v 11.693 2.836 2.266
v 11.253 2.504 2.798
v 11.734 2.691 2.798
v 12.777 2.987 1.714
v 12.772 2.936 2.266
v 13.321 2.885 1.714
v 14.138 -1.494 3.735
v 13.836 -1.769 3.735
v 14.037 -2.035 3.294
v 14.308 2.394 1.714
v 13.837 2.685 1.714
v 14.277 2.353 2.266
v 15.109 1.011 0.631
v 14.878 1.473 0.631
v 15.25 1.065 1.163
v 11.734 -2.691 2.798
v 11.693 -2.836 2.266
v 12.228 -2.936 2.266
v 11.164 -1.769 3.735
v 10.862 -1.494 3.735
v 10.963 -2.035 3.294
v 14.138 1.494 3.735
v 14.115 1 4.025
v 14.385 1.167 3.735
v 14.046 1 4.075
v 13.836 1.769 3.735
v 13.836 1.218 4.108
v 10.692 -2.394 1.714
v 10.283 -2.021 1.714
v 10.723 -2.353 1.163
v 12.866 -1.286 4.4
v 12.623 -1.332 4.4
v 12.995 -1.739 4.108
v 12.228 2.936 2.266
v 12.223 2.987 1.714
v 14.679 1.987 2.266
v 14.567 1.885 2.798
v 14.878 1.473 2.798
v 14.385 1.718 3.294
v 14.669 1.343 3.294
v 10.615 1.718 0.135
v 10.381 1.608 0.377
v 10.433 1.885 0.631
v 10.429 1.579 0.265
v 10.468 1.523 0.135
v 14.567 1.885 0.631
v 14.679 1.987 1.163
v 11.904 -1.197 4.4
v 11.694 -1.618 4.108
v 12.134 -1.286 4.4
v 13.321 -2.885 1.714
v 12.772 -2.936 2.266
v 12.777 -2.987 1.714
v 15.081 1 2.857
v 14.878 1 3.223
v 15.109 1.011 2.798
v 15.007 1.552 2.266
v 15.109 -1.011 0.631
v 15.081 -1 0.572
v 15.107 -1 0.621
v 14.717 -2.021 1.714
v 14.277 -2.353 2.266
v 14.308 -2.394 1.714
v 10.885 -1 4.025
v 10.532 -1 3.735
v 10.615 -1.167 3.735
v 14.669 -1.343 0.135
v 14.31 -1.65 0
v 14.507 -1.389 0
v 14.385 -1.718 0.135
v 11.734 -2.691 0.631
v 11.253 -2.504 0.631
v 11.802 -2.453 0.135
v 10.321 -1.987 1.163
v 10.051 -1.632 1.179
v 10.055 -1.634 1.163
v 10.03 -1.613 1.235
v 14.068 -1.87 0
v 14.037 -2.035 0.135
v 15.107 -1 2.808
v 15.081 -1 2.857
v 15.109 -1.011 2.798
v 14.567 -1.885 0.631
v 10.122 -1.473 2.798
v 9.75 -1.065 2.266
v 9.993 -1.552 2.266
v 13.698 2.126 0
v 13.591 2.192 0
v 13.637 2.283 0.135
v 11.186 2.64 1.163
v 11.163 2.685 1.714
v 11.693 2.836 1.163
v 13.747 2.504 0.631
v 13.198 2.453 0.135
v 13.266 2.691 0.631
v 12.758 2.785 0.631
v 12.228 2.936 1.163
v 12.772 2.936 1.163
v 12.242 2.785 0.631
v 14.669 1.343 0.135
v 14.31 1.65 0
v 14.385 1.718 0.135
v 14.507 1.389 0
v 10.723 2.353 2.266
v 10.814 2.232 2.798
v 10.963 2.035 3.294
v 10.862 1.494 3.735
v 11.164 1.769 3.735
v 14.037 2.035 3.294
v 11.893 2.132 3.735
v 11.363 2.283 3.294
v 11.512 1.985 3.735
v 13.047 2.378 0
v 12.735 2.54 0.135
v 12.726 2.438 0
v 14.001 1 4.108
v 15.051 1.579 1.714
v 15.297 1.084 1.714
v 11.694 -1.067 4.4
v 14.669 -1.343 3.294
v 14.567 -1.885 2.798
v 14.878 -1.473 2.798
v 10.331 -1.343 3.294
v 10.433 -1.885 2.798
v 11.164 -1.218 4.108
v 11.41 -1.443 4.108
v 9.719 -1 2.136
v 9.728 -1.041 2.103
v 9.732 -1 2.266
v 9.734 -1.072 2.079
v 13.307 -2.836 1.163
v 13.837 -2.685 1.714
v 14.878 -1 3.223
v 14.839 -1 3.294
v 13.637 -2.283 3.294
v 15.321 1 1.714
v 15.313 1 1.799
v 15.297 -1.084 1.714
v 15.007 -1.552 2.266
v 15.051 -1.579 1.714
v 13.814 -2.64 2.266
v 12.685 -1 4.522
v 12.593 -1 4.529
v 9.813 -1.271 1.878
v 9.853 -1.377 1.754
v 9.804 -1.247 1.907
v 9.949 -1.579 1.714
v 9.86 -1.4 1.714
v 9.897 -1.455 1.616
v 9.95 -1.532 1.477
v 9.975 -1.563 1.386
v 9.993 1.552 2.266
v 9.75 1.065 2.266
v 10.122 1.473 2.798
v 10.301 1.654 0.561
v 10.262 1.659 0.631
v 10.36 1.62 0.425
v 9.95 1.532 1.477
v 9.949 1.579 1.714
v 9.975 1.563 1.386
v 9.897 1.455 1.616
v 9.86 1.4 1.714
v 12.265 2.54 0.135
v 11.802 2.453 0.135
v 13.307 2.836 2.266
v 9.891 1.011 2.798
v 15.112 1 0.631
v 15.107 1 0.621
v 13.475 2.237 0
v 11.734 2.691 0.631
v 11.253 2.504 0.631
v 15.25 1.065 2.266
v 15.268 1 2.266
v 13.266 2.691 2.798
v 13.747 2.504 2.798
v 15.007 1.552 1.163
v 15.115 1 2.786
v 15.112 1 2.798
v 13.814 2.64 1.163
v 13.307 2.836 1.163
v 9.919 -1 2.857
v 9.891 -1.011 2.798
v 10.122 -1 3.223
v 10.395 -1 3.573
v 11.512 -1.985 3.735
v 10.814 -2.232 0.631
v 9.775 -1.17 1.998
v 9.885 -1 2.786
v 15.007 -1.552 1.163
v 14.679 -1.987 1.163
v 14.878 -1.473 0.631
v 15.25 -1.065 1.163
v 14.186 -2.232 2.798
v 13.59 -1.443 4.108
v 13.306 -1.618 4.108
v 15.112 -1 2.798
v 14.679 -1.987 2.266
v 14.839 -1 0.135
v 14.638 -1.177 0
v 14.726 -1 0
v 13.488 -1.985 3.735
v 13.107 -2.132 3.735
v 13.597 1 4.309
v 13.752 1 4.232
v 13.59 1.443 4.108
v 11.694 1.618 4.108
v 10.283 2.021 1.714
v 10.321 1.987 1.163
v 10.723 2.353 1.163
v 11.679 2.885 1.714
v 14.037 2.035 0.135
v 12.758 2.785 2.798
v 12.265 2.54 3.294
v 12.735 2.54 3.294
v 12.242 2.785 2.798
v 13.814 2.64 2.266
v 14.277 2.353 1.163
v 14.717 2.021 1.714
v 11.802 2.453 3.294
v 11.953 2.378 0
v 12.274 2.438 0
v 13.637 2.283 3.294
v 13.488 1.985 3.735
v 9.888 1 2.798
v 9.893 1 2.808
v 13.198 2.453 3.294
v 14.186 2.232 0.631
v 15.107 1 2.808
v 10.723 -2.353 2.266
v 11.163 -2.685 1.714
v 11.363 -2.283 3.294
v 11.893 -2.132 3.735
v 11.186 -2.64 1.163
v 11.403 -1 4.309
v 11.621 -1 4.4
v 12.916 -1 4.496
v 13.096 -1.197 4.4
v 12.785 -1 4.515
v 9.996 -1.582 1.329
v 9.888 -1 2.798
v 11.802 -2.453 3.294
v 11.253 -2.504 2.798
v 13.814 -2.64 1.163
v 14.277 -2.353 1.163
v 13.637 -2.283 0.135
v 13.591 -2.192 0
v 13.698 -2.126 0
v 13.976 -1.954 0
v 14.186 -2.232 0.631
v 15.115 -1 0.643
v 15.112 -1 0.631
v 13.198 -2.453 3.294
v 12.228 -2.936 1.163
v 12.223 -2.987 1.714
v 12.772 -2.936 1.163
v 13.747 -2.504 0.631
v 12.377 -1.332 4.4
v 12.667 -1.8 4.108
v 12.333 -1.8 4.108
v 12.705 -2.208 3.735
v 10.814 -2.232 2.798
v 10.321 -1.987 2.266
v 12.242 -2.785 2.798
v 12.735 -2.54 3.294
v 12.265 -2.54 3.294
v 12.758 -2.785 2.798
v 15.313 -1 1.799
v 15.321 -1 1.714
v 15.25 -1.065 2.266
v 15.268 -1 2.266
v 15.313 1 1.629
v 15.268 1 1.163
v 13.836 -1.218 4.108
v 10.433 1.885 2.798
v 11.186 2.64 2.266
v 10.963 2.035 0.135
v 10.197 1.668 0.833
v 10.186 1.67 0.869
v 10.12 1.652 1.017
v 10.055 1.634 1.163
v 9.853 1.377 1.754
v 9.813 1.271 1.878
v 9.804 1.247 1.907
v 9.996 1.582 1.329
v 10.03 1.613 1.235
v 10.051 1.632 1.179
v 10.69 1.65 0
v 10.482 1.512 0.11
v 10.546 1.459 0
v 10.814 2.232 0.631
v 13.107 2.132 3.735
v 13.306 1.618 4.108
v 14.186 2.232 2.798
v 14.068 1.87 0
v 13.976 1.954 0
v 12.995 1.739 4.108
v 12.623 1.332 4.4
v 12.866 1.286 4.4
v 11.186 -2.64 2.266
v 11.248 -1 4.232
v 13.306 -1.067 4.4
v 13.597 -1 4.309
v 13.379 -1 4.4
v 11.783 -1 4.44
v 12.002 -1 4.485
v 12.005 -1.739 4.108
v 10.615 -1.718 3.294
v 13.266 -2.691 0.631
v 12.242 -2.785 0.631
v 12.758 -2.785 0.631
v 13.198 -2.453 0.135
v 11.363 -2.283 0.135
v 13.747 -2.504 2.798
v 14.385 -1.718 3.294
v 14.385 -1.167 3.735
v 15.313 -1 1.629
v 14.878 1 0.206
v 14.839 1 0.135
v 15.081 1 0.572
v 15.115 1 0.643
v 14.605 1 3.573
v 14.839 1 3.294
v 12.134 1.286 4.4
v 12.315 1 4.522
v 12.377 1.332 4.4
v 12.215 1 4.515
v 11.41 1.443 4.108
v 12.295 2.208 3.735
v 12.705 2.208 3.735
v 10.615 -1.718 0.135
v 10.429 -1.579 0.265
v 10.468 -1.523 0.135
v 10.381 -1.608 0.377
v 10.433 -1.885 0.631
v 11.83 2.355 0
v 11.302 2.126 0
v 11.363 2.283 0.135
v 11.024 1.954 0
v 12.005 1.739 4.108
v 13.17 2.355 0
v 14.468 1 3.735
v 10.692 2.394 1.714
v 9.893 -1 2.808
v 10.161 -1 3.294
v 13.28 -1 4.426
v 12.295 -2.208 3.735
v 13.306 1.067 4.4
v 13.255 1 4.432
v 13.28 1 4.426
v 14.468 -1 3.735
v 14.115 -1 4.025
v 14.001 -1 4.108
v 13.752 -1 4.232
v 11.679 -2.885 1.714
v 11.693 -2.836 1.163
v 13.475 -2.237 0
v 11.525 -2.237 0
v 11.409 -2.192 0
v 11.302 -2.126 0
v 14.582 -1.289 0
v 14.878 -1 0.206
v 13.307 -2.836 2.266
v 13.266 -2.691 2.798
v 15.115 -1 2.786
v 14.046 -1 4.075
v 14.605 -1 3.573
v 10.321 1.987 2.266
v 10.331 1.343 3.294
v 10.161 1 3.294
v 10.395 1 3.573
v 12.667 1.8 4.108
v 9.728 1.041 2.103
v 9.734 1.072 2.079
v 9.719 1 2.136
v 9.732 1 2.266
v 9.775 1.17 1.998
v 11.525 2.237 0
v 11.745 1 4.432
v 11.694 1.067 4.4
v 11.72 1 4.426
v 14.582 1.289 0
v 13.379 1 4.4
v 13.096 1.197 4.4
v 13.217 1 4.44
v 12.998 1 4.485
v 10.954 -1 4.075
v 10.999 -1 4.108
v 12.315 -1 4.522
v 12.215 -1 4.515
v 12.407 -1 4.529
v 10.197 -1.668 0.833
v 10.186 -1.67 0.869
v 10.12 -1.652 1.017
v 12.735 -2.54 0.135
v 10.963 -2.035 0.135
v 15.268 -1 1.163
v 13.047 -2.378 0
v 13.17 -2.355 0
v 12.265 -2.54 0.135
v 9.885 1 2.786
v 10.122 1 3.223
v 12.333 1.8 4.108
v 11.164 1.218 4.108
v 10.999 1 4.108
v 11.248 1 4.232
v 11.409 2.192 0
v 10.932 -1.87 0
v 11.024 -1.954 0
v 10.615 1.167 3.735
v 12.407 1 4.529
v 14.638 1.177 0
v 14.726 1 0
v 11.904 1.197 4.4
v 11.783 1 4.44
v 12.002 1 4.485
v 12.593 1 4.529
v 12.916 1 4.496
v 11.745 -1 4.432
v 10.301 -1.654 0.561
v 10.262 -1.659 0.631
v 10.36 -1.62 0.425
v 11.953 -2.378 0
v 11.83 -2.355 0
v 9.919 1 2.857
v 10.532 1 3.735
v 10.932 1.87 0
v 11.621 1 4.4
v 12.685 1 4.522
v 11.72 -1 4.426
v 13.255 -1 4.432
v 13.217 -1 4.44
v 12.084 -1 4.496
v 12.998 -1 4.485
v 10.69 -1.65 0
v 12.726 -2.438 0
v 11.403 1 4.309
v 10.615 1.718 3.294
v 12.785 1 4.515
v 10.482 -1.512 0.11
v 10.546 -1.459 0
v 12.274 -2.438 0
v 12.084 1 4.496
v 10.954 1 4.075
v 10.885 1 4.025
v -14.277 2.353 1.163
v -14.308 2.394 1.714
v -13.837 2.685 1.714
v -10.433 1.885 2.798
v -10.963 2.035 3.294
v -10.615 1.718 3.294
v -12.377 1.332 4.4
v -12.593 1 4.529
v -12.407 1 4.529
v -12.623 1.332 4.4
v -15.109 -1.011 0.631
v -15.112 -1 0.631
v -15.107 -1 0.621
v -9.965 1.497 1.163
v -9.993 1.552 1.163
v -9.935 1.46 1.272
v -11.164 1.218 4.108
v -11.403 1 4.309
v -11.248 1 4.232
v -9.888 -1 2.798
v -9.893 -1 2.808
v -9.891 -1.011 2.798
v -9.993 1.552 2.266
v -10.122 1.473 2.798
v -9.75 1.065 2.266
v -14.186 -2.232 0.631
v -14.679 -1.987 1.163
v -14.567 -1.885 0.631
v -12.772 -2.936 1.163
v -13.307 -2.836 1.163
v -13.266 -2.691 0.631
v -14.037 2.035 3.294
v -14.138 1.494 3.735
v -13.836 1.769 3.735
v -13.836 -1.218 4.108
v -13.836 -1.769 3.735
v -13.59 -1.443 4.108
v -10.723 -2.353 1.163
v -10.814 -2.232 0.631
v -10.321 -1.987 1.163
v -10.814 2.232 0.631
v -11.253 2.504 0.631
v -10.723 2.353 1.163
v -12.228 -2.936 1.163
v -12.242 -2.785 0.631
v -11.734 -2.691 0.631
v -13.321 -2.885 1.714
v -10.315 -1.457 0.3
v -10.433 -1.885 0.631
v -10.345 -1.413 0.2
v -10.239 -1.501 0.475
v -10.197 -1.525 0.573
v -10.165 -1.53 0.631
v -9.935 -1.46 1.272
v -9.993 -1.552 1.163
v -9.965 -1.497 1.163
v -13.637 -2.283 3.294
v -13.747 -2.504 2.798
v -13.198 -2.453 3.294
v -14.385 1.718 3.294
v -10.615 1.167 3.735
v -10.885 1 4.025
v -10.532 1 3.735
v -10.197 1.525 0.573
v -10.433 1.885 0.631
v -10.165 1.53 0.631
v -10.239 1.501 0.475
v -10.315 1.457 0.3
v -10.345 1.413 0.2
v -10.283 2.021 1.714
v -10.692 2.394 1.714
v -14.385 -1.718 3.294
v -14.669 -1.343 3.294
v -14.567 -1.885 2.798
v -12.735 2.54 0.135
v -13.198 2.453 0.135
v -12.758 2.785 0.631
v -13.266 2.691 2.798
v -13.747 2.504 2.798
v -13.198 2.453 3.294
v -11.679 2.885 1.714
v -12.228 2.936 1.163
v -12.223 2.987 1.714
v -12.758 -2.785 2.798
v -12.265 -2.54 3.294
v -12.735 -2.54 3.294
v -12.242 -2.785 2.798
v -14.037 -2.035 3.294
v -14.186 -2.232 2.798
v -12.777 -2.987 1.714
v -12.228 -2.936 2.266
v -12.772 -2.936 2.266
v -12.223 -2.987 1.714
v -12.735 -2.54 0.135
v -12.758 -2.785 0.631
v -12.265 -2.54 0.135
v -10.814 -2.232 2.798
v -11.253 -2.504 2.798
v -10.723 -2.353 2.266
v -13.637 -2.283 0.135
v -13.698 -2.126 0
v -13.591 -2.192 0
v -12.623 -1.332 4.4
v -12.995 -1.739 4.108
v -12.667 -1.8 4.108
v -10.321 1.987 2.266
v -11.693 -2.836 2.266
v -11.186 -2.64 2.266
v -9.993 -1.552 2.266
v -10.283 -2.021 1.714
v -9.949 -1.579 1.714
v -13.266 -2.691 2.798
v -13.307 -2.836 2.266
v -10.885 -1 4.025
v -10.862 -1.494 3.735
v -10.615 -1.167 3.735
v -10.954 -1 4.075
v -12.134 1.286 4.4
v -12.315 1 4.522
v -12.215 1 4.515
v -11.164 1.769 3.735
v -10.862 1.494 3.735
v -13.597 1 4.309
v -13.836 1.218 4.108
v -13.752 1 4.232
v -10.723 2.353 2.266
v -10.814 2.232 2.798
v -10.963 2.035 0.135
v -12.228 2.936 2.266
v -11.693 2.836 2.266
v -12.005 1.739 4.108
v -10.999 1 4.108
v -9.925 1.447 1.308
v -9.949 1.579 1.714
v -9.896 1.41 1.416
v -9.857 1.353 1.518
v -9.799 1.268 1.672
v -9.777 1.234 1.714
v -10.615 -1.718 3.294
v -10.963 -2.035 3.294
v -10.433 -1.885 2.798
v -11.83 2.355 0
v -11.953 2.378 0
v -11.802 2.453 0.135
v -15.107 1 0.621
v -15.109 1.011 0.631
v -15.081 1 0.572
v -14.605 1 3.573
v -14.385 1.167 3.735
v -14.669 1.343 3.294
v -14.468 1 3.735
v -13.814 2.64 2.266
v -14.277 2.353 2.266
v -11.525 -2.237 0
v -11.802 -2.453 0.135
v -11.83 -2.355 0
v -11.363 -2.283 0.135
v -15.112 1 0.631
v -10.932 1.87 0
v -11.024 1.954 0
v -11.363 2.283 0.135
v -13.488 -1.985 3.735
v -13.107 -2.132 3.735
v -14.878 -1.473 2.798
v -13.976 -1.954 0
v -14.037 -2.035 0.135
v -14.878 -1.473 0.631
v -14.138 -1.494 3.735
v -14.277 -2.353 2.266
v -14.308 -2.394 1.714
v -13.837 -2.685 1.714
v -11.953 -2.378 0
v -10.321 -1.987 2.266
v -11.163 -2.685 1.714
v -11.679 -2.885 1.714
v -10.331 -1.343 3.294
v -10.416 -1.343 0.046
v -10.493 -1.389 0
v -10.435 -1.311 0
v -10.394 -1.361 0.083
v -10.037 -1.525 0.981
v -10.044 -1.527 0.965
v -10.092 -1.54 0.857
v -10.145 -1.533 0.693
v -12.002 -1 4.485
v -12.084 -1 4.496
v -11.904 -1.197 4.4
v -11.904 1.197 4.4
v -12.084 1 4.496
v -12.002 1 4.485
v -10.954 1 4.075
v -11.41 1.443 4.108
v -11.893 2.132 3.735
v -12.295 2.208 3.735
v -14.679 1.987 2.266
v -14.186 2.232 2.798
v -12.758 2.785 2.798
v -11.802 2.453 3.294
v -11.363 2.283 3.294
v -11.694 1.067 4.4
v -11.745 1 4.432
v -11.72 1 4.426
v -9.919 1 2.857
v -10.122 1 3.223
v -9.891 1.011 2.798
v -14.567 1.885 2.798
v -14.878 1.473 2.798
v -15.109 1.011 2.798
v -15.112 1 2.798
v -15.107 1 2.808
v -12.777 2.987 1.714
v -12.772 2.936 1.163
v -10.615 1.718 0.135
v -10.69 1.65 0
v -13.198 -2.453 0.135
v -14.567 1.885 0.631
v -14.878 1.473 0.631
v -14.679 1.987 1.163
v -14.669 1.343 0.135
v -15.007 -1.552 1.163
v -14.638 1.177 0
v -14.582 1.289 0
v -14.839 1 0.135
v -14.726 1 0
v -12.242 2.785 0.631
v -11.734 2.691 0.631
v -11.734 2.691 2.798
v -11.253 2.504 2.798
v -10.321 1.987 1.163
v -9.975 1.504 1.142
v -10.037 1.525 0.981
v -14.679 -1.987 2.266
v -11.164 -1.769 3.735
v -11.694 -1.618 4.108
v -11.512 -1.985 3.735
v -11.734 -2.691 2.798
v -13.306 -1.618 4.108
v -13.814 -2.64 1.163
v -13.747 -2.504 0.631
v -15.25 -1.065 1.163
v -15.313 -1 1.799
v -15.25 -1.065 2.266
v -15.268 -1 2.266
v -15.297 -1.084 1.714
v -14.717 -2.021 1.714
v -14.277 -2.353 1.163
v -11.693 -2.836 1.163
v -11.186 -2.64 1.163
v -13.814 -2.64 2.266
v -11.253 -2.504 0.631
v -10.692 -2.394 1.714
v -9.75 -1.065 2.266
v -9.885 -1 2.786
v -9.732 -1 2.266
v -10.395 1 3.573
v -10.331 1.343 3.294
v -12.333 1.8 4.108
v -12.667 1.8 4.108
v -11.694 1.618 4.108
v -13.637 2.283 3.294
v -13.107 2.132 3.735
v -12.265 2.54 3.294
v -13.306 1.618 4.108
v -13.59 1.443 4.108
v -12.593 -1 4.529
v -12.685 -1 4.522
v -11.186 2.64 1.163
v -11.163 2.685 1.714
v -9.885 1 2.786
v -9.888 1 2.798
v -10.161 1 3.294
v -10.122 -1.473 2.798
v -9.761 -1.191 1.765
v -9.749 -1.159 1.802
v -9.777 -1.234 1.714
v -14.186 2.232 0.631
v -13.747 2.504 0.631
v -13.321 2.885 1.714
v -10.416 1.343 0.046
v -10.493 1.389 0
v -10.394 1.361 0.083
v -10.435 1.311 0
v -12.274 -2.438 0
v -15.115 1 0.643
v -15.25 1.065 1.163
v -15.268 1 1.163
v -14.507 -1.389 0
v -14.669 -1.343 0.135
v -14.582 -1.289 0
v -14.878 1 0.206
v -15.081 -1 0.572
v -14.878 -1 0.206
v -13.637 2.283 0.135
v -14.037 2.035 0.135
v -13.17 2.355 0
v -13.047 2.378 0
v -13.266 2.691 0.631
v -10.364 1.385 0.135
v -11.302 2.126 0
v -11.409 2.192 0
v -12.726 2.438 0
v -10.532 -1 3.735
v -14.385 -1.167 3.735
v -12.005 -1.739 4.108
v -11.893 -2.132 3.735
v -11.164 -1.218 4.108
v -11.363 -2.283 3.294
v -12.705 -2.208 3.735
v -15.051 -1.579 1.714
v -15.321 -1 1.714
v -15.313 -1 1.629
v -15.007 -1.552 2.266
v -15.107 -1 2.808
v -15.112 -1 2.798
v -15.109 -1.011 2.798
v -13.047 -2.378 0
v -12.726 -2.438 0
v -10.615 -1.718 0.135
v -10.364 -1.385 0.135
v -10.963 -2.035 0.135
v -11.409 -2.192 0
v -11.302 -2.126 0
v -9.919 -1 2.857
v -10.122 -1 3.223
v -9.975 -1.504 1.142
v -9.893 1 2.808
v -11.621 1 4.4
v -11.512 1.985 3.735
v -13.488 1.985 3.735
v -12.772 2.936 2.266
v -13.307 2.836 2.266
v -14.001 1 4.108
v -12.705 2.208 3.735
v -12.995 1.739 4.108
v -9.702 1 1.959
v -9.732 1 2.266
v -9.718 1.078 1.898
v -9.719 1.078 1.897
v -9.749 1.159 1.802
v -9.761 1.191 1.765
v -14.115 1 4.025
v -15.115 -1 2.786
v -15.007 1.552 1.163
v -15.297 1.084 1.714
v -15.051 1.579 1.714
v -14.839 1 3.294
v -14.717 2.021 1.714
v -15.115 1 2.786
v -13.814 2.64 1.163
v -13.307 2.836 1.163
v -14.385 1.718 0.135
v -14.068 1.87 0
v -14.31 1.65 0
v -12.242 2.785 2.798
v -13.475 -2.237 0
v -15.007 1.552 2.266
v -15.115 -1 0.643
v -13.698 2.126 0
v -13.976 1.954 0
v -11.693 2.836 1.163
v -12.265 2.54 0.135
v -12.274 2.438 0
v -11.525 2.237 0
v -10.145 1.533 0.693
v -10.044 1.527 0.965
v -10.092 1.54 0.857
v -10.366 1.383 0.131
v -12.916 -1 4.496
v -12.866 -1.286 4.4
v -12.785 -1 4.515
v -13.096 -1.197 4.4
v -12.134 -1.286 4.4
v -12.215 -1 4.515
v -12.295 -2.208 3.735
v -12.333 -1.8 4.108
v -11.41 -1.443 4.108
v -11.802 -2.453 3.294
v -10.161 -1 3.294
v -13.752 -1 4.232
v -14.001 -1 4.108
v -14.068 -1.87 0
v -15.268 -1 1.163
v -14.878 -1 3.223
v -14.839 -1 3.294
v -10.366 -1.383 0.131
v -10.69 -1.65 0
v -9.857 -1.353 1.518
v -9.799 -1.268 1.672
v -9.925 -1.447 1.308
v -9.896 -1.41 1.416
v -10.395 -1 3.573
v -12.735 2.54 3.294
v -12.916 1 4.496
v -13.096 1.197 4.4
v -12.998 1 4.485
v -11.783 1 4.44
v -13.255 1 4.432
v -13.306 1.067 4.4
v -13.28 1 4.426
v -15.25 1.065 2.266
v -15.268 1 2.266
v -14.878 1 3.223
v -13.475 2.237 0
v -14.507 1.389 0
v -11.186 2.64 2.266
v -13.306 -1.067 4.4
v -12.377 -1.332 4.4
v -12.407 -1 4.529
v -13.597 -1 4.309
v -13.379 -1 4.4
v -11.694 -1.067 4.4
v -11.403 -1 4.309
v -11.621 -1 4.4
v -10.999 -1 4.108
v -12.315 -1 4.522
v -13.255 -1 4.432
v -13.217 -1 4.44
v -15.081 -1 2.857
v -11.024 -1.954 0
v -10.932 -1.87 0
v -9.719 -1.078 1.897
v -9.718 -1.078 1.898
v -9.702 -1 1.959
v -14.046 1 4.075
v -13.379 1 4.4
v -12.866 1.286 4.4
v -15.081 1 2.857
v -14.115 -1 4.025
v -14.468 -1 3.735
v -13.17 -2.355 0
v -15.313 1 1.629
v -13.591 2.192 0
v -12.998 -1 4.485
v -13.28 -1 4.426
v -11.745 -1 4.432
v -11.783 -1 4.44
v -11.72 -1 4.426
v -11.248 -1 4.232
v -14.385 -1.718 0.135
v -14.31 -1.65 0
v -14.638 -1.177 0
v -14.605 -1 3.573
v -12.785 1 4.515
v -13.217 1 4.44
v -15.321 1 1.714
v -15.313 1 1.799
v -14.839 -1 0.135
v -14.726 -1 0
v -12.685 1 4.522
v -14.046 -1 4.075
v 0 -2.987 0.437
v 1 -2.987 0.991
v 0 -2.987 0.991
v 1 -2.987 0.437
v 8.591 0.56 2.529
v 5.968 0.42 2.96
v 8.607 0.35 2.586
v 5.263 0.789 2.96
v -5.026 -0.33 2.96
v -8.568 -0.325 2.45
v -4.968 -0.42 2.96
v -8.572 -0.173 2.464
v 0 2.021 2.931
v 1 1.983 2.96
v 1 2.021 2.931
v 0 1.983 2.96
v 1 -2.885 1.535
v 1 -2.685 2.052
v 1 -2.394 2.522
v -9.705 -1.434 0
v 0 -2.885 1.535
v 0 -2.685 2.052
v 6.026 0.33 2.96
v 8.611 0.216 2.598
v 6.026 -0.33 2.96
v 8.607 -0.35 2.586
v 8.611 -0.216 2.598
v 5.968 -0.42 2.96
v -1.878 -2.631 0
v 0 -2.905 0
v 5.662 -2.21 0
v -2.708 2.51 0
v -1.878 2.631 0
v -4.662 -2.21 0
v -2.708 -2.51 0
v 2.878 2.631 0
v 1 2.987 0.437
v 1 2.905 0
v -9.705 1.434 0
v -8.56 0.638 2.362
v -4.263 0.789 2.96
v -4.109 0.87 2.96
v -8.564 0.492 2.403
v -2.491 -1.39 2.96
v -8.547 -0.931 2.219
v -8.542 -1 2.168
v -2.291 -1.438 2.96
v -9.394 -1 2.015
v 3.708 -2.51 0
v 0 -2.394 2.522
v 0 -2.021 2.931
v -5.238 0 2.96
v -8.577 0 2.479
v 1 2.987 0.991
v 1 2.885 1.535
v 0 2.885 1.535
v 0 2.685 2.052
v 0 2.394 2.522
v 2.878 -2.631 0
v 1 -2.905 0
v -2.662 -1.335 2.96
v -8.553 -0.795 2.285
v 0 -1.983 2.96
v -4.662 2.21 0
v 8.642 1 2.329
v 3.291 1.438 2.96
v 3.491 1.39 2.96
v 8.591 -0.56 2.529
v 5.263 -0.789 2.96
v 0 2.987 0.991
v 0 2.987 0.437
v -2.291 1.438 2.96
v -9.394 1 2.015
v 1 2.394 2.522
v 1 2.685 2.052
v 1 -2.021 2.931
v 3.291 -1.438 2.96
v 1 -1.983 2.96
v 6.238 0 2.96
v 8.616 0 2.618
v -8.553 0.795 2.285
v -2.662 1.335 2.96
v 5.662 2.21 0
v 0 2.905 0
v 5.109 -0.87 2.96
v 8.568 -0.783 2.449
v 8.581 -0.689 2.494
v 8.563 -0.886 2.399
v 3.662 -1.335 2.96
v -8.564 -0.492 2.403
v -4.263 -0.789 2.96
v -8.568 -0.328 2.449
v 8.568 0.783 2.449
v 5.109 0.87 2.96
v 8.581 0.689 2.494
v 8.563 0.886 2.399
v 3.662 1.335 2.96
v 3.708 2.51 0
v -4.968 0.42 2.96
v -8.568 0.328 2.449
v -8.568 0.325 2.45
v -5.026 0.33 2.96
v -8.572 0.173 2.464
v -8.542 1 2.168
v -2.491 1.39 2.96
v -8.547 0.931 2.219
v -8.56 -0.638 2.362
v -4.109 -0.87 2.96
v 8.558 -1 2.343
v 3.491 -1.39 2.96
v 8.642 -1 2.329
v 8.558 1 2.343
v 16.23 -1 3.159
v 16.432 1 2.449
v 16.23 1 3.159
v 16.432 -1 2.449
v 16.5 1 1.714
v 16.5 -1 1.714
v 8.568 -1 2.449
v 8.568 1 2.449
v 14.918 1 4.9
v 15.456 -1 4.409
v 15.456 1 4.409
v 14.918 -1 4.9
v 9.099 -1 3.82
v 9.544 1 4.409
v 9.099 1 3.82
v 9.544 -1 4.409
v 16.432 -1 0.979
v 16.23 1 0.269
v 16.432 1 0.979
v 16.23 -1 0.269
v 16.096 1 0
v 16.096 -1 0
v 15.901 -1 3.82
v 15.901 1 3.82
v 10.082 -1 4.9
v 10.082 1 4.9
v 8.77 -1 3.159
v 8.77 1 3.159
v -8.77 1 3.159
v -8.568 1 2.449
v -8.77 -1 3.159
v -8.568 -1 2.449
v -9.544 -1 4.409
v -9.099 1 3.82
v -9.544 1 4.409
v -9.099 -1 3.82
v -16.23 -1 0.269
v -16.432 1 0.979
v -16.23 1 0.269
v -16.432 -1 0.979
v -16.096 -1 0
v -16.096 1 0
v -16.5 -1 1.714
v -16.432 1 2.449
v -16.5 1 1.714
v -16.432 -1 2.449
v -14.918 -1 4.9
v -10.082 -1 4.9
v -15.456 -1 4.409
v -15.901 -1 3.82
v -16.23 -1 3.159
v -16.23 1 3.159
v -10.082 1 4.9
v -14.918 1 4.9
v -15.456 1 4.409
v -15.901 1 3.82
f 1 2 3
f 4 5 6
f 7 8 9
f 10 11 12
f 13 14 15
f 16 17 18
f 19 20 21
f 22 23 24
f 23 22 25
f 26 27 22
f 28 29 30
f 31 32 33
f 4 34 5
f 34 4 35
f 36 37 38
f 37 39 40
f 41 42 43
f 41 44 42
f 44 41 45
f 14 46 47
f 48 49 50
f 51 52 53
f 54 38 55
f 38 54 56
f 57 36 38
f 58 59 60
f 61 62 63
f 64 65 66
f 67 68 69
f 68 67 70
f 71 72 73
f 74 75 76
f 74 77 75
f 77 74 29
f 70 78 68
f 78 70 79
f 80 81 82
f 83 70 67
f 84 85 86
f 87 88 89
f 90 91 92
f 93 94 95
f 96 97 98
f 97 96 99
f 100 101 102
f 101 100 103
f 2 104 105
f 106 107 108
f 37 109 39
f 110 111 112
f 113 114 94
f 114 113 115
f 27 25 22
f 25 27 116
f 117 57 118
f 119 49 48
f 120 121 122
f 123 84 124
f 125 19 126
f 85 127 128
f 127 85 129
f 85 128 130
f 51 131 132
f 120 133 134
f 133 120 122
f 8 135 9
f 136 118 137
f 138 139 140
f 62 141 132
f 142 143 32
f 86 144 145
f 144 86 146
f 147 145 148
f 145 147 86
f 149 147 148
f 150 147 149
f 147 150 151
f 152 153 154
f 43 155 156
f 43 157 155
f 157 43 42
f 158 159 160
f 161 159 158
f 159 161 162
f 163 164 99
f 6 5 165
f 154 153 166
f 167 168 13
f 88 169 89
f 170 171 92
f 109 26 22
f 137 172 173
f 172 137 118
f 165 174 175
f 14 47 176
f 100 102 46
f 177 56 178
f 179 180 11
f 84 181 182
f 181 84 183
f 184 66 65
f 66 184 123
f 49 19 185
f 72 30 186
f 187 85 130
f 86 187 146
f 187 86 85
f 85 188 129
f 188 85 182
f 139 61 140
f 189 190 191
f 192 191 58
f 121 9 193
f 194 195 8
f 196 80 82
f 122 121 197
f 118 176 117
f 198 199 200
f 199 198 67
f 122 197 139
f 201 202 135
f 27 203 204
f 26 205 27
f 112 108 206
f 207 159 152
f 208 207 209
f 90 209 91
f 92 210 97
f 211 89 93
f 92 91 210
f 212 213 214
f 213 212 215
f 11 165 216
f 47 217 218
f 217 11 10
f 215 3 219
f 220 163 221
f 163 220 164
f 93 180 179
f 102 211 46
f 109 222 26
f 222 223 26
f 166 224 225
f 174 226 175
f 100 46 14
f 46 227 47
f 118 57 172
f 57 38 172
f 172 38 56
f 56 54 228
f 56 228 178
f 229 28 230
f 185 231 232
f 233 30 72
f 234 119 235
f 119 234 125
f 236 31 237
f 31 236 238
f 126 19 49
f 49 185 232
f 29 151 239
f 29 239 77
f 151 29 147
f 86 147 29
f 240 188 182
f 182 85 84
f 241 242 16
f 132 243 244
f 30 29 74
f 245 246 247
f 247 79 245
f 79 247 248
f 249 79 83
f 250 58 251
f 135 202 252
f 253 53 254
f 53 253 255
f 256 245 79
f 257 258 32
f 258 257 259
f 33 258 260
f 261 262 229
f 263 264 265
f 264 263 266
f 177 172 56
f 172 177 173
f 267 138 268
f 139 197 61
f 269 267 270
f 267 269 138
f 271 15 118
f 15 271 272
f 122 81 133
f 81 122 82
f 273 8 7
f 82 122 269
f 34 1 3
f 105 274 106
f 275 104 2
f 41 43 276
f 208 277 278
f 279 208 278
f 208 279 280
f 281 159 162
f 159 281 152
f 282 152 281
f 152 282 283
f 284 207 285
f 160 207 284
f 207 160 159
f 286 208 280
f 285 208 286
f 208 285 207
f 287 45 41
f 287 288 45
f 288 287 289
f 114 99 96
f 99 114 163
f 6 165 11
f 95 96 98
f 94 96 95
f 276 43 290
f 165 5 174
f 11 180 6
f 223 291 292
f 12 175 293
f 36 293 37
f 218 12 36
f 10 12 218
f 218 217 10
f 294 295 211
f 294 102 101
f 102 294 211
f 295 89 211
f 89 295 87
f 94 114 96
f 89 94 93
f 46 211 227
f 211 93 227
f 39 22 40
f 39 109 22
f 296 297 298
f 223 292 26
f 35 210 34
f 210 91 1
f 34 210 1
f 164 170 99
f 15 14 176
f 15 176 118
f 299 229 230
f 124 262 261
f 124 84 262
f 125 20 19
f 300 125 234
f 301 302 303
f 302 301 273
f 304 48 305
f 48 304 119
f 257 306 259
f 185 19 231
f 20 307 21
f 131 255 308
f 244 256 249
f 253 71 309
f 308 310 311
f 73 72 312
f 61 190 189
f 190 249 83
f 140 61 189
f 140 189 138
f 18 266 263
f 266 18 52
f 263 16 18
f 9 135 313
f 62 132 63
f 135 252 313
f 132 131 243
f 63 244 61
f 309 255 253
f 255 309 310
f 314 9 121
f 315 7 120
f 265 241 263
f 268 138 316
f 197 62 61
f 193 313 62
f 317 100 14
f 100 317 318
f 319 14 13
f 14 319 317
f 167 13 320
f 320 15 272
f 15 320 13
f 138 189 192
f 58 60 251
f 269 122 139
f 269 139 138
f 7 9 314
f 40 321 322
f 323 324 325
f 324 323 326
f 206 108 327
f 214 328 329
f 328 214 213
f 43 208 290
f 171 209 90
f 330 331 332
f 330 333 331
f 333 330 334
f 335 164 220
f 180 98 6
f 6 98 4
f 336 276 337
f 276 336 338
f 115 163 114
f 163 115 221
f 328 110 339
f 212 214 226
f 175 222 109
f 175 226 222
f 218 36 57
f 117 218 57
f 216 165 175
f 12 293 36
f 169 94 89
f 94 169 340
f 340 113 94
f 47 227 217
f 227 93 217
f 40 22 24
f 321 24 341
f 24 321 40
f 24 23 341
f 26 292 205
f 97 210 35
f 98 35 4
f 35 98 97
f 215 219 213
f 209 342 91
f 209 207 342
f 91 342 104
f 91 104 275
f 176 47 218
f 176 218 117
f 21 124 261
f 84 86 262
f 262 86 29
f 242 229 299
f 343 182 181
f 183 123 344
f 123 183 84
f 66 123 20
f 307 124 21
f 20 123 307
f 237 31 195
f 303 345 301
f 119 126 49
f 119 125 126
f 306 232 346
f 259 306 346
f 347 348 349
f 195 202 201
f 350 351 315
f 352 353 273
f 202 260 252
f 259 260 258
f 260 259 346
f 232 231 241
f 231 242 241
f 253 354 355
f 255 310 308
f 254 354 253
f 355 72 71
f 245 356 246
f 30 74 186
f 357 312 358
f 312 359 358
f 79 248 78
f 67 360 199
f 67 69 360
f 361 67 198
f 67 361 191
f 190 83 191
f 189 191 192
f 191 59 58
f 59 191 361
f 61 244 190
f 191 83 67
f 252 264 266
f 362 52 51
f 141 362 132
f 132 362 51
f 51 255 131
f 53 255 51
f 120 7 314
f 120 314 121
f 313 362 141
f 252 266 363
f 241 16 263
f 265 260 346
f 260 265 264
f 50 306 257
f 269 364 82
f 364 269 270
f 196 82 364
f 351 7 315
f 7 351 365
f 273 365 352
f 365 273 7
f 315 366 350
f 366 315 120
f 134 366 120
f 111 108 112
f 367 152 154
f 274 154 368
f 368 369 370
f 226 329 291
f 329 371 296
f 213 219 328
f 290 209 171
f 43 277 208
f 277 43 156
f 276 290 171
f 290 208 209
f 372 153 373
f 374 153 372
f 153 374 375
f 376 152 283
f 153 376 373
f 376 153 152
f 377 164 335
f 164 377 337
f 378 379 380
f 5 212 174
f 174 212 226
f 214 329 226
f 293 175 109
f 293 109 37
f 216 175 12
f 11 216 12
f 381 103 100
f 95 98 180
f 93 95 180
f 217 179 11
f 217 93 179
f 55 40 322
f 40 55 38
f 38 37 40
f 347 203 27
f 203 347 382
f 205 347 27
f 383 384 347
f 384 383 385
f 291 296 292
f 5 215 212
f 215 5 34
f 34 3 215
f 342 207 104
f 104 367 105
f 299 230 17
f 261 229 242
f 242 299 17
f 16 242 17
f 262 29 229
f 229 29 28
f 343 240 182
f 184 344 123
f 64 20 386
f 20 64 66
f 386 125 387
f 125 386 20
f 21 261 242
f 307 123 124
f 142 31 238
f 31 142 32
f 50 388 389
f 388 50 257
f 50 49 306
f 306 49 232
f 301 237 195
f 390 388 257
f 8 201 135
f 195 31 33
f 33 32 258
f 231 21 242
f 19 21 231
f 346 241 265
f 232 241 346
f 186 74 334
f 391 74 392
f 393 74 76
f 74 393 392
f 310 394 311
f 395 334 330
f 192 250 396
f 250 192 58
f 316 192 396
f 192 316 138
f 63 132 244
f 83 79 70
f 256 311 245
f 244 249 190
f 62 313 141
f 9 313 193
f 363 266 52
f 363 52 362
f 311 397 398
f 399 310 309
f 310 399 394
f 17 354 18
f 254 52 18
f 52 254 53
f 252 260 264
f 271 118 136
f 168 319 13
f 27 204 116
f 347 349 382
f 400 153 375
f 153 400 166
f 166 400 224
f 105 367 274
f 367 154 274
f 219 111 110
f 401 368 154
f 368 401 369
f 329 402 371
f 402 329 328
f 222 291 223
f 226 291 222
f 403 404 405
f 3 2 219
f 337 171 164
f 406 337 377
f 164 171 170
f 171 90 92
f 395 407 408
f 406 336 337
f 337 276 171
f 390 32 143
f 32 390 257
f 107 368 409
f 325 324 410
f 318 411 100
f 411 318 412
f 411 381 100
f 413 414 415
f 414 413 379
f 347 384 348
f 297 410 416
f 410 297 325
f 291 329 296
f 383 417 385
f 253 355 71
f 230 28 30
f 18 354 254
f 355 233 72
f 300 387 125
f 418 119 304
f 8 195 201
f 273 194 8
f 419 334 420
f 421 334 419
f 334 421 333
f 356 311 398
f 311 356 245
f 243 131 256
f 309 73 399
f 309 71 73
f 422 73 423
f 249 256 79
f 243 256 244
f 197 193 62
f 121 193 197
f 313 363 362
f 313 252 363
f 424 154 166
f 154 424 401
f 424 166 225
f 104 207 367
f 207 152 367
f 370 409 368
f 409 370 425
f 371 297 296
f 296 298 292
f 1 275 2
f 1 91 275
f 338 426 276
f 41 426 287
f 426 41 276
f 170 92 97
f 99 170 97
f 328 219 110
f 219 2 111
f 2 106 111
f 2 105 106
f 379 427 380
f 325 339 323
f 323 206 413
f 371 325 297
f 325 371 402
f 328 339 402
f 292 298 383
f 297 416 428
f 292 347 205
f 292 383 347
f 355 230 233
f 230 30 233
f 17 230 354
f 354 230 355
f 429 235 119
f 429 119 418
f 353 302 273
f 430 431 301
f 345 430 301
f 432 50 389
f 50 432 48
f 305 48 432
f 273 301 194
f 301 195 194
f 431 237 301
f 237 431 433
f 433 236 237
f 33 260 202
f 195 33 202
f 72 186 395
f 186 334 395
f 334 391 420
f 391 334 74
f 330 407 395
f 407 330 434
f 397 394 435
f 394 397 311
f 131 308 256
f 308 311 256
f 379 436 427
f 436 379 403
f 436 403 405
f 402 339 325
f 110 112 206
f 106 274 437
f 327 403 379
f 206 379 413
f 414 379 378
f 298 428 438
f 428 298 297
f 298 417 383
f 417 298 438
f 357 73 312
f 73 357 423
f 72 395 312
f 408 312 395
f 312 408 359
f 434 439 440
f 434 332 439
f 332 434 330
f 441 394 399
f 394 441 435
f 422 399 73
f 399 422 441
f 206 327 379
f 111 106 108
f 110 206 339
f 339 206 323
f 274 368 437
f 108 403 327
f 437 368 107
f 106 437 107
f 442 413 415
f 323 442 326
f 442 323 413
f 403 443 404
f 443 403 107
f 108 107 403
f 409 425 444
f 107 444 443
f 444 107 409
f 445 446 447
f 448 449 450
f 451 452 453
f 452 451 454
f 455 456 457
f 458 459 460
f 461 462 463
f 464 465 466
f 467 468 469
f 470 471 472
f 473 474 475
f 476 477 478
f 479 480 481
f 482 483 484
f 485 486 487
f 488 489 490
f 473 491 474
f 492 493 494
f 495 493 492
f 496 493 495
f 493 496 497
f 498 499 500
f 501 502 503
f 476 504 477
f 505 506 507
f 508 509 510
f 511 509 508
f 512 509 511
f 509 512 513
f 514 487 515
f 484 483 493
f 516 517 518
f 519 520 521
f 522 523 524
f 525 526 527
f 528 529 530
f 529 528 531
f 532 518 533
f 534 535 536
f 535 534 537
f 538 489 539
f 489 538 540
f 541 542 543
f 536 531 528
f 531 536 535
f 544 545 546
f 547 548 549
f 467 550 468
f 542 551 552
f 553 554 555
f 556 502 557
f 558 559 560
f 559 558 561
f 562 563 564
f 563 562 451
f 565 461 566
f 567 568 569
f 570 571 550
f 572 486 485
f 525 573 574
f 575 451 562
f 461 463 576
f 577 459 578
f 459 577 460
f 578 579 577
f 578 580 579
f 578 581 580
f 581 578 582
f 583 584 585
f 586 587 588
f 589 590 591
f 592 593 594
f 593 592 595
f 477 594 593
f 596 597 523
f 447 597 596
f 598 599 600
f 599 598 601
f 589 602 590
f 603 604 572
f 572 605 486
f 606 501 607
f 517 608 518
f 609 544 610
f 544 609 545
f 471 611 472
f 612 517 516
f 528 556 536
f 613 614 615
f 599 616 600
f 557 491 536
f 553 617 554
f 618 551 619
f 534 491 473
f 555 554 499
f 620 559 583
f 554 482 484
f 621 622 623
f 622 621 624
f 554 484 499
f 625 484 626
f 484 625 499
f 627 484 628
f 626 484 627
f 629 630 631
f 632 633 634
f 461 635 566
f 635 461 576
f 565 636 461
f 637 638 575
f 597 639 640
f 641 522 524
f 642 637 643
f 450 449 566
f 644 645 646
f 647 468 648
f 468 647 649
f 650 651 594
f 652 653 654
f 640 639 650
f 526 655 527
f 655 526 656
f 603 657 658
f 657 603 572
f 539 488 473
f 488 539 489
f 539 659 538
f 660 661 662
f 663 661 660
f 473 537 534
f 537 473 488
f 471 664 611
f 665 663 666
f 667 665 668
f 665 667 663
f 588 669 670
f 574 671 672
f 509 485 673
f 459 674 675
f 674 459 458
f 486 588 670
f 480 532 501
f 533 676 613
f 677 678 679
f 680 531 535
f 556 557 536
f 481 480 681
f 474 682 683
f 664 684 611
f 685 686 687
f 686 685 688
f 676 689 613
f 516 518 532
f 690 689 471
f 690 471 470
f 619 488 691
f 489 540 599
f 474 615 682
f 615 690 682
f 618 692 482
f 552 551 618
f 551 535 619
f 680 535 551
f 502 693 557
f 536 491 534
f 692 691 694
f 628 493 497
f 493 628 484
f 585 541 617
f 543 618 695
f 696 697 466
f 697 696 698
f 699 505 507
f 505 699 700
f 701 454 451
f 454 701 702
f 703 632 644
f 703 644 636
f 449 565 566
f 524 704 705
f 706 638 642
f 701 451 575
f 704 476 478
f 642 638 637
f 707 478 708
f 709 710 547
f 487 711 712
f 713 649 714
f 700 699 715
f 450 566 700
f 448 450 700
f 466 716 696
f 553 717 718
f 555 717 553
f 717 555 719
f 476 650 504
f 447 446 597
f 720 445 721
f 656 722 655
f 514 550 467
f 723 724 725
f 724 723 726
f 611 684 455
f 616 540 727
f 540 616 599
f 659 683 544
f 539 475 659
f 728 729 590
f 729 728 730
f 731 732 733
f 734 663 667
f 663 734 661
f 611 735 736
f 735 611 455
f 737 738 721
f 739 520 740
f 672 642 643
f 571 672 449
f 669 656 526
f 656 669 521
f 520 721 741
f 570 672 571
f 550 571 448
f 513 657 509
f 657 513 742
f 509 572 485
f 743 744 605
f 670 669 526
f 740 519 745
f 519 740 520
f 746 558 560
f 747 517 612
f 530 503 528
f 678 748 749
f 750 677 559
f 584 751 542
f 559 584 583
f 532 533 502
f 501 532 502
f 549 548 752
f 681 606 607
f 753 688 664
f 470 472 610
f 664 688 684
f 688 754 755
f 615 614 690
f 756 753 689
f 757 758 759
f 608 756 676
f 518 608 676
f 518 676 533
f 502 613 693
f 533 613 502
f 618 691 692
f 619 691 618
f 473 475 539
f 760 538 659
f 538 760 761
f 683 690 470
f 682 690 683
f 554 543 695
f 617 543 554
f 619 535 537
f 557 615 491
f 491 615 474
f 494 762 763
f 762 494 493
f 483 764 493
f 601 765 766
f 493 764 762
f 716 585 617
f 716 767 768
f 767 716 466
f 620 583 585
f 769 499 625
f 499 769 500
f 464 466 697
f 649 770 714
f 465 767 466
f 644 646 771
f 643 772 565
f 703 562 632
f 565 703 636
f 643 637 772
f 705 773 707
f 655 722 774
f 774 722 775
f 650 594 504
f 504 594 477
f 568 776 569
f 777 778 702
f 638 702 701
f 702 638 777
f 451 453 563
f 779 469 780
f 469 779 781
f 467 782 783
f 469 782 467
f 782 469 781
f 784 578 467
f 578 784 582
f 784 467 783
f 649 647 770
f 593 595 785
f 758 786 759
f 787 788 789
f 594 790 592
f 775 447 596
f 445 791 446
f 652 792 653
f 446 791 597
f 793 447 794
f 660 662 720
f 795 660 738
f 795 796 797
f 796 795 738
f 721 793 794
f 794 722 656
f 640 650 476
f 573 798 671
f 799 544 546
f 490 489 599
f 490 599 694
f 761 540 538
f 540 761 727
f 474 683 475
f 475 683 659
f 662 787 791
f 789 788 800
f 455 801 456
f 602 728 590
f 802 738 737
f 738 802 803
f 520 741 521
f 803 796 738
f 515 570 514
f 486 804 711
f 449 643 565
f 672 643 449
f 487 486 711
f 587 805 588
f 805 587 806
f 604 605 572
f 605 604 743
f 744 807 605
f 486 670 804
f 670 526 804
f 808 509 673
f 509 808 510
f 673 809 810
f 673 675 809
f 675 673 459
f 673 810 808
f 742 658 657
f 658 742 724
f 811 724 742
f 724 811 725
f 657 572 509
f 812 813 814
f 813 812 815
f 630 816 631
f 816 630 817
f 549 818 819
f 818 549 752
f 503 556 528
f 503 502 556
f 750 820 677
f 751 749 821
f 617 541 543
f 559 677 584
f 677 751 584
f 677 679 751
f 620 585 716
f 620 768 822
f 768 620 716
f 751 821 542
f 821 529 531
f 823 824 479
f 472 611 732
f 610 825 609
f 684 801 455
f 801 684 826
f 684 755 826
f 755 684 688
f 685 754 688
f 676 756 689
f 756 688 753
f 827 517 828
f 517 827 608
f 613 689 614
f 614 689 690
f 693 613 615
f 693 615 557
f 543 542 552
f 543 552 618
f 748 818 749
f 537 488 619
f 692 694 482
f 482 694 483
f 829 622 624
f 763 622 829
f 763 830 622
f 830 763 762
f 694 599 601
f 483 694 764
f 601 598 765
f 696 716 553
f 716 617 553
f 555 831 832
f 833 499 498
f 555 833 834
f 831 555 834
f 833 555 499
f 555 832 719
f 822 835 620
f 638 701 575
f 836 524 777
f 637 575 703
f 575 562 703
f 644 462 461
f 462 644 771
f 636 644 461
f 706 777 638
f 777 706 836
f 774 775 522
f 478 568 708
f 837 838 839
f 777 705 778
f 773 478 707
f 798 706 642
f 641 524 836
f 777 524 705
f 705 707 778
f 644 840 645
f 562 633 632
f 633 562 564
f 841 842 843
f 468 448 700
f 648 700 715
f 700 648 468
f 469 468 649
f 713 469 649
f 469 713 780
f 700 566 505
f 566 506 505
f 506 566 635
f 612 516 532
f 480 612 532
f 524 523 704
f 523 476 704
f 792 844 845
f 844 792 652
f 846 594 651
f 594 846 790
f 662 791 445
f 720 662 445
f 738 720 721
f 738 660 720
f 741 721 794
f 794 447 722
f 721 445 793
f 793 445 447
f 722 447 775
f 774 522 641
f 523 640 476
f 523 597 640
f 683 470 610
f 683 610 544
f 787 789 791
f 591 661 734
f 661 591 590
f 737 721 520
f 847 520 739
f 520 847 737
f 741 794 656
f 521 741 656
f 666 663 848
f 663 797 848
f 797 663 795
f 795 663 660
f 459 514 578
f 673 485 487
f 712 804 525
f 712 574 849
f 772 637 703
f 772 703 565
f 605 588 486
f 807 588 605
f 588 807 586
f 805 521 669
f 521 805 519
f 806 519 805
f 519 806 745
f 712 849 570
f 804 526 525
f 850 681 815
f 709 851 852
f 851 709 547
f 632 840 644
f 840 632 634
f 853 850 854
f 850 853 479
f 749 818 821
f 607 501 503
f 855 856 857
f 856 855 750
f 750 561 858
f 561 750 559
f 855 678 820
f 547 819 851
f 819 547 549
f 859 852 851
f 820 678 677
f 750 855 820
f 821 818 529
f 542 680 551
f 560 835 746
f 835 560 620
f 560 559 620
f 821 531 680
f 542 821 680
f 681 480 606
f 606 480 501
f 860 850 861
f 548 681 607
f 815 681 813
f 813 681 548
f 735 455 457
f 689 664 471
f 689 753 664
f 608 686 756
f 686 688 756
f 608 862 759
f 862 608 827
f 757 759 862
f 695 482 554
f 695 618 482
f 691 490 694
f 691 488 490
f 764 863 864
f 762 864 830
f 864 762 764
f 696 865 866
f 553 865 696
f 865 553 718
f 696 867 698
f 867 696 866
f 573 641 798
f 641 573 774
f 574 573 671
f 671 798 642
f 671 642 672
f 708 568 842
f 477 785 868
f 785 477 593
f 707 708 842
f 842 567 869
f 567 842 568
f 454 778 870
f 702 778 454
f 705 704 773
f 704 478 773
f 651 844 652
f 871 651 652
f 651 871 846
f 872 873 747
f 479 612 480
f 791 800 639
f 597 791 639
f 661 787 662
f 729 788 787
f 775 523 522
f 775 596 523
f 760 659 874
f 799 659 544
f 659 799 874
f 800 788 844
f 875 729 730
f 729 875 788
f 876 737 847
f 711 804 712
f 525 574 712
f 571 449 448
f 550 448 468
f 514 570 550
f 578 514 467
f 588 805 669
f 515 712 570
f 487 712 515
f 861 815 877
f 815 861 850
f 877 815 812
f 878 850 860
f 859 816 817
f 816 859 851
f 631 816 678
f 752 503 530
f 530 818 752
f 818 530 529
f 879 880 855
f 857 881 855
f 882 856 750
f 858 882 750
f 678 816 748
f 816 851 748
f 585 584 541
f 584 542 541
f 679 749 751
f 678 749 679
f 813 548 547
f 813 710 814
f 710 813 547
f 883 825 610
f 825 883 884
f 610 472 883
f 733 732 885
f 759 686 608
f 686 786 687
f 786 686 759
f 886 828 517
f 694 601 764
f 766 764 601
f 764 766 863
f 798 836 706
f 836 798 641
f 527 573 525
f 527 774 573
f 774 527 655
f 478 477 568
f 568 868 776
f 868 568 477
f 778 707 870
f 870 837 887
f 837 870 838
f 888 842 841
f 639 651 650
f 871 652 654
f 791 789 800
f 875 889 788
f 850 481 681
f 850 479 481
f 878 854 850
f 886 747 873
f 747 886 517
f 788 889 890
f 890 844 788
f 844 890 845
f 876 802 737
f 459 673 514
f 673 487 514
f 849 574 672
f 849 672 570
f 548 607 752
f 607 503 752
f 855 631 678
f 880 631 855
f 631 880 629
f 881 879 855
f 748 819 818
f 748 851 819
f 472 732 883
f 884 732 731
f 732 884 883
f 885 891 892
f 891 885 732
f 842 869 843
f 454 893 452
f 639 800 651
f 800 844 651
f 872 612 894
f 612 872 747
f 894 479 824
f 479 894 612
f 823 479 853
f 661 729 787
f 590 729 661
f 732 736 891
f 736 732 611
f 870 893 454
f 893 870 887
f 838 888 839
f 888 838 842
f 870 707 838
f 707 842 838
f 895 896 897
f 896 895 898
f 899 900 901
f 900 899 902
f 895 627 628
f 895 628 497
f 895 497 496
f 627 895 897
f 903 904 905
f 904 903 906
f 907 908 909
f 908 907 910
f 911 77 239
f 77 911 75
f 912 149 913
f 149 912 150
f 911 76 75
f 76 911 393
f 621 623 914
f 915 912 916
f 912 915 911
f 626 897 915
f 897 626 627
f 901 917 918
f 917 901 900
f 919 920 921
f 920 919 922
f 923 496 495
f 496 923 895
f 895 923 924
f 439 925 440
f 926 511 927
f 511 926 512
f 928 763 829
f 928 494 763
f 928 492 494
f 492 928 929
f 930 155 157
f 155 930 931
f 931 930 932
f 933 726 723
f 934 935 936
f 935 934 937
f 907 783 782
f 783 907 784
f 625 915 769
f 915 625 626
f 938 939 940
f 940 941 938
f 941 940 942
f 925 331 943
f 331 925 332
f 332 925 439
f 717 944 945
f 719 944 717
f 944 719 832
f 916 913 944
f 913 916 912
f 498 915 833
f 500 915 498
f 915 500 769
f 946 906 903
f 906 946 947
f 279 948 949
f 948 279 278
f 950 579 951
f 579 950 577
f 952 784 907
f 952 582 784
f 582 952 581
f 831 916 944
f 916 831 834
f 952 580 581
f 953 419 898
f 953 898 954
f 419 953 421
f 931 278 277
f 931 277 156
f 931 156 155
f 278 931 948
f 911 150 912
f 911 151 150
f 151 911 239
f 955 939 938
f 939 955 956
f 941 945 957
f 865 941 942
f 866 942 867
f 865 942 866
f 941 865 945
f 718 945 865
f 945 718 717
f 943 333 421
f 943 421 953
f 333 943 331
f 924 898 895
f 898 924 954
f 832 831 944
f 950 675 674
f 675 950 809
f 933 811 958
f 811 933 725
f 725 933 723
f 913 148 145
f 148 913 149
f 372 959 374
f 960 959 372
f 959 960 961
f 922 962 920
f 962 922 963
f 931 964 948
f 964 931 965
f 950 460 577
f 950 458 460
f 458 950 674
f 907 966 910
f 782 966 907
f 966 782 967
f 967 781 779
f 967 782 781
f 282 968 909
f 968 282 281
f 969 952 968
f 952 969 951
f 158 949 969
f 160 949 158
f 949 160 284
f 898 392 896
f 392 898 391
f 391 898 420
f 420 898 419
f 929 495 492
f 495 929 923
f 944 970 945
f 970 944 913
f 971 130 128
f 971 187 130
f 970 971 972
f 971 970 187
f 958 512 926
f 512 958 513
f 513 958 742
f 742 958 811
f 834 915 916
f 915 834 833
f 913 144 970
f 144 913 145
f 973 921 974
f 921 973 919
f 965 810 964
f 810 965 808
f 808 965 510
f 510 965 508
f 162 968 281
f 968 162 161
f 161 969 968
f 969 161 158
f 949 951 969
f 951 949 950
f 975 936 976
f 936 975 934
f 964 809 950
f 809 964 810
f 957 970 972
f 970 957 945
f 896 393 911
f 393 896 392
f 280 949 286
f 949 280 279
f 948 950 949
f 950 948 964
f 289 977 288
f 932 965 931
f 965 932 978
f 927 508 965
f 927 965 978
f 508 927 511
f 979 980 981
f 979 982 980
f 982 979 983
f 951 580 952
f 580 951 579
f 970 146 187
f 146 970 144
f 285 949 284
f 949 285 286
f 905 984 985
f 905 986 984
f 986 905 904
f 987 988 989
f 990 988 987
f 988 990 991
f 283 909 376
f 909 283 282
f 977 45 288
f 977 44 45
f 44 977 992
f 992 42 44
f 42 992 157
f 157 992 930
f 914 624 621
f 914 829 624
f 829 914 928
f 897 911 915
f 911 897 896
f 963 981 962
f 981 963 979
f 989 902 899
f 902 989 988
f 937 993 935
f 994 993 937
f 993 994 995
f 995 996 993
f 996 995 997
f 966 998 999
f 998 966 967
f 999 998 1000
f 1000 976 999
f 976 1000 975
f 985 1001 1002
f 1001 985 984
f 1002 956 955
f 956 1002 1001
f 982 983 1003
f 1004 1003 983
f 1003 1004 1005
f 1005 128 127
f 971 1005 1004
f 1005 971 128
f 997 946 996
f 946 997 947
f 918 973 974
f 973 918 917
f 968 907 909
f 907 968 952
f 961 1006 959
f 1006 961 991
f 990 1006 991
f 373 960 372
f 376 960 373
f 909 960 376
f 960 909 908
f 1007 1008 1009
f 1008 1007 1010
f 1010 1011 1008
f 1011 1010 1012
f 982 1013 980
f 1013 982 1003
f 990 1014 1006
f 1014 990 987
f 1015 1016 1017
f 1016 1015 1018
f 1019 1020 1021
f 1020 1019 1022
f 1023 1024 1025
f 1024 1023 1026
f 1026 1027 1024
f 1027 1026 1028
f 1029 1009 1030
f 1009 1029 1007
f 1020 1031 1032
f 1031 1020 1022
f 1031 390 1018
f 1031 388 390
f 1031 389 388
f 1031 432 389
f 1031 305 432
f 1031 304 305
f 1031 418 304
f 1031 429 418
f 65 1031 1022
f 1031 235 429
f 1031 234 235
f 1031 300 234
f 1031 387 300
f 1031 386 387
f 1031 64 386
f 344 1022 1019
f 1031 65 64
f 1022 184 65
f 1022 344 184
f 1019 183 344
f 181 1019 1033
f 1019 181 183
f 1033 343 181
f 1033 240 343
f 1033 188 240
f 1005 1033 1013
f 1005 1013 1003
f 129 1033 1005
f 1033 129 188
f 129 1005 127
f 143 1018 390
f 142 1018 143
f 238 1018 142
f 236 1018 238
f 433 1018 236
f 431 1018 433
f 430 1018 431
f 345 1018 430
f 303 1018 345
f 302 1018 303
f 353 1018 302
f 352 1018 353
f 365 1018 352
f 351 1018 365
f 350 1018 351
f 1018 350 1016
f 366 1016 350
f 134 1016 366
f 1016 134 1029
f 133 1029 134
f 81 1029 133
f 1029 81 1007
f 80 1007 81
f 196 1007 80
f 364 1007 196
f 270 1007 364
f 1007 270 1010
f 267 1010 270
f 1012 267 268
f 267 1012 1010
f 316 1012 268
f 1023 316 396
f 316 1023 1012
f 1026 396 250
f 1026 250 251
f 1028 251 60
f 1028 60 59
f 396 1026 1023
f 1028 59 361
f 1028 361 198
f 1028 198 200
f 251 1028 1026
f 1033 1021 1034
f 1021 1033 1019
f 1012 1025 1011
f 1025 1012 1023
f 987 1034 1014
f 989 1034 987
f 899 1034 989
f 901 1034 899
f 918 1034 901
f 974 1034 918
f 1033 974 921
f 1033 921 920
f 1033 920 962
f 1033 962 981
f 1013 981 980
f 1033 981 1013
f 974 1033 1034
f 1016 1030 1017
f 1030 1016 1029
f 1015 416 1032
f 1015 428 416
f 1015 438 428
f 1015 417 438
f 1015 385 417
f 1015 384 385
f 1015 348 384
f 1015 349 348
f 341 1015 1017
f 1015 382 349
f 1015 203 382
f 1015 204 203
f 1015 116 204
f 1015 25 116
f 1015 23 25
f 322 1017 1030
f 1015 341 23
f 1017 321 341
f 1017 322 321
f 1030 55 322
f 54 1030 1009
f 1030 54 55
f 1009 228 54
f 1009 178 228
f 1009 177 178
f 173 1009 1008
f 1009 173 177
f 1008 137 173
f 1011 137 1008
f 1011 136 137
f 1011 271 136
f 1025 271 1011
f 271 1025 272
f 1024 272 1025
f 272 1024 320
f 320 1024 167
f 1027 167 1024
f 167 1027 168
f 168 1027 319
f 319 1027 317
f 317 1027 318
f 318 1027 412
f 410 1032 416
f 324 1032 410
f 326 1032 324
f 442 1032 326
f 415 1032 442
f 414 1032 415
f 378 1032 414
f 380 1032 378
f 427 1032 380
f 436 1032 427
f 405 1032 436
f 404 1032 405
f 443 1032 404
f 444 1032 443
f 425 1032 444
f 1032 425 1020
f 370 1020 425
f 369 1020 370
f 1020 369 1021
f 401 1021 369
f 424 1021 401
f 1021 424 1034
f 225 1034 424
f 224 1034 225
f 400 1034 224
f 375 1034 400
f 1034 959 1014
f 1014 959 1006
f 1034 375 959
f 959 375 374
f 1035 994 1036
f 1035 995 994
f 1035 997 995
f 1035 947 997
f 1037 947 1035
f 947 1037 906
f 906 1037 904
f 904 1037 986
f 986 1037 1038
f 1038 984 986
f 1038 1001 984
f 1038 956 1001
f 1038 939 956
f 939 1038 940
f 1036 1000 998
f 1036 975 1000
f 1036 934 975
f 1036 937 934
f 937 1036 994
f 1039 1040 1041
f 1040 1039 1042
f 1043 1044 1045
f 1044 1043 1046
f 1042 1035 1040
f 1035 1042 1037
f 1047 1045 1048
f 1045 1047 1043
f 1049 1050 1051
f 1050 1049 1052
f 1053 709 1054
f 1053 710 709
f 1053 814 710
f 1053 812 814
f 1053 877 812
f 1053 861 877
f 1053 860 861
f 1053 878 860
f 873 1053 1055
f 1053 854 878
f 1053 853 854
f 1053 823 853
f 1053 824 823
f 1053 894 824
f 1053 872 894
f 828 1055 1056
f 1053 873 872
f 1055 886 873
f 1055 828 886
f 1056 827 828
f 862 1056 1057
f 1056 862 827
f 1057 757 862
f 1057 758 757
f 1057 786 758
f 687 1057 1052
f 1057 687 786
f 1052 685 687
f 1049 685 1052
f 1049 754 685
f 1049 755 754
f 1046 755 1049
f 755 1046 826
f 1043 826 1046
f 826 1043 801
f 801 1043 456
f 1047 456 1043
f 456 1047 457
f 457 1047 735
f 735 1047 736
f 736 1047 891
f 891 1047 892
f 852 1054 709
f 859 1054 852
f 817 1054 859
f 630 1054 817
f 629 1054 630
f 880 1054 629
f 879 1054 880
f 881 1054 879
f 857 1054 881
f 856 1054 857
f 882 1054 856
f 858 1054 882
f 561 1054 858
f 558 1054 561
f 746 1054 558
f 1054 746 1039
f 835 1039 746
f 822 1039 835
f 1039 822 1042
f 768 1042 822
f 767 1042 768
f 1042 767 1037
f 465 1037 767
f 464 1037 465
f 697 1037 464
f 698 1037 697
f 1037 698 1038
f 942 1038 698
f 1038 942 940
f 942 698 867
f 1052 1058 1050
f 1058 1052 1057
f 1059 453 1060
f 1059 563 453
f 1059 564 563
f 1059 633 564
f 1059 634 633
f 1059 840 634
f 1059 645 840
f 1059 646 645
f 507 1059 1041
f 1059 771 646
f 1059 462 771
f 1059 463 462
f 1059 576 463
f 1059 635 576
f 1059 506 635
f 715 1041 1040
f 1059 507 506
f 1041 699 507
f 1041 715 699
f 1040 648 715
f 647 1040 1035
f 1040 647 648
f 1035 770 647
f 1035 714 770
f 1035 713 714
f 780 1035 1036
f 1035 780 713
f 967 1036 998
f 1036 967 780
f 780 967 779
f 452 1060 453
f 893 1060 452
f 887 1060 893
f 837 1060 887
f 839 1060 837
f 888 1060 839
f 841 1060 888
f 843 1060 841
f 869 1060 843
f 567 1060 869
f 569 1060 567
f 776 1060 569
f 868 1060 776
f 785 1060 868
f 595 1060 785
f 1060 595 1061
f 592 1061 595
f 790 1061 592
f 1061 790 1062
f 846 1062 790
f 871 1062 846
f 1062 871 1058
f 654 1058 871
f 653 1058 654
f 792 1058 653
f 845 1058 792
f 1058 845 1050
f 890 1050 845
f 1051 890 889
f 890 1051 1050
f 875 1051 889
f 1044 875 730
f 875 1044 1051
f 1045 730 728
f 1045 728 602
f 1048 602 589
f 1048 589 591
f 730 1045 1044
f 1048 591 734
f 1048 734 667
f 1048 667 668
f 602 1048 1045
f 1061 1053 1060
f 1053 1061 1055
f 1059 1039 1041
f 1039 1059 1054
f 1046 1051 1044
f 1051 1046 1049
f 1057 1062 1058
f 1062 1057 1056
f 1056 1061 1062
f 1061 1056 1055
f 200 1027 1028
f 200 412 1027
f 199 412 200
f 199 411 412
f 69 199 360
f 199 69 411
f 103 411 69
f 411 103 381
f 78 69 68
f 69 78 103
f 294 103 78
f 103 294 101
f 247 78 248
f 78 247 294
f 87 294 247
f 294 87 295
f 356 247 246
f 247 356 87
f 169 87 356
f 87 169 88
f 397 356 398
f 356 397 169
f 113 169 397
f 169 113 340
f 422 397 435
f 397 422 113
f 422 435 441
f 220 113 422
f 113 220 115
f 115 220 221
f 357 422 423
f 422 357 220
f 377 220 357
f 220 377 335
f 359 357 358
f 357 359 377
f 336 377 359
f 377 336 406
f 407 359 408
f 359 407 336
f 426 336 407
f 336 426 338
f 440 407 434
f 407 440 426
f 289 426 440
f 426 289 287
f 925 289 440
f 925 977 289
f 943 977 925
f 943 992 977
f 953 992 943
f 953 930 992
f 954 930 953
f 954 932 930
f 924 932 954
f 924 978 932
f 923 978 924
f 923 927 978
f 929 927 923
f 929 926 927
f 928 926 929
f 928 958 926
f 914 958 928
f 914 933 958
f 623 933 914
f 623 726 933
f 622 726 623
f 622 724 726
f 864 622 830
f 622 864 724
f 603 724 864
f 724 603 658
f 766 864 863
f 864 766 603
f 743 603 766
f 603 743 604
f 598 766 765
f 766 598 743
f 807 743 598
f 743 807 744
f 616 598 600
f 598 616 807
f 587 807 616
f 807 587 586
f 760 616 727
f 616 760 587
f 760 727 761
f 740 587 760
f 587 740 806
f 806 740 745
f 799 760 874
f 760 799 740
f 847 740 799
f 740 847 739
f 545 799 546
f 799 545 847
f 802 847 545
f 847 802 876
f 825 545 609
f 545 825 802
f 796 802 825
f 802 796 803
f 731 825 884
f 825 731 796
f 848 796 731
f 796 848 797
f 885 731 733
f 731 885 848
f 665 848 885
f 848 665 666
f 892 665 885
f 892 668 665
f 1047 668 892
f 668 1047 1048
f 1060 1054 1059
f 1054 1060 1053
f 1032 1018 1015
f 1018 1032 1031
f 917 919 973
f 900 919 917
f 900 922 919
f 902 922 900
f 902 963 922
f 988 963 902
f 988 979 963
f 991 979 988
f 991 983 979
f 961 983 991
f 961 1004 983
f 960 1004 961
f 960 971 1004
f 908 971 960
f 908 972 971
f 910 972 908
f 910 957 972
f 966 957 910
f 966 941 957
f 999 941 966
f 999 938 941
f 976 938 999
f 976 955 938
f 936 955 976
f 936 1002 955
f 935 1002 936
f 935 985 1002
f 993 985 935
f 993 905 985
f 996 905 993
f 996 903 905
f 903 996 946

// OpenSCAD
// (C) Michał (yru) Liberda 2013
// rel under GPL

//joint ball radius
linkrad=6;
//link lenth
llen=25;
//middle dia
lwi=6;
//cutout coef.
lhi=0.66;


legu();

module legu(lrad=linkrad,ll=llen,lw=lwi,lh=lhi,sthns=34){

difference(){

translate([0,0,lrad/3.5]) union(){ //translate([0,0,0])
translate([ll/2,0,0]) sphere(r=lrad/2,$fn=sthns);
translate([-ll/2,0,0]) sphere(r=lrad/2,$fn=sthns);


hull(){
translate([ll/2,0,-1]) rotate([0,90,0]) cylinder(r=lrad/5,$fn=sthns);
translate([0,0,-1]) rotate([0,90,0]) cylinder(r=lw/2,$fn=sthns);
translate([-ll/2,0,-1]) rotate([0,90,0]) cylinder(r=lrad/5,$fn=sthns);
}

translate([ll/2,0,0]) rotate([90,0,0]) cylinder(r=lrad/1.5,h=lrad/3,$fn=sthns,center=true);
translate([-ll/2,0,0]) rotate([90,0,0]) cylinder(r=lrad/1.5,h=lrad/3,$fn=sthns,center=true);

}//union ends

translate([0,0,(lrad+lw)/-2]) cube([ll+lrad*2,lrad+lw,lrad+lw],center=true);
translate([0,0,(lrad+lw)/2+lrad*.9-.5]) cube([ll+lrad*2,lrad+lw,lrad+lw],center=true);
translate([0,0,(lrad+lw)/2+lw*lh-1]) cube([ll/2,lrad+lw,lrad+lw],center=true);

}//difer ends

}//moudle ends
